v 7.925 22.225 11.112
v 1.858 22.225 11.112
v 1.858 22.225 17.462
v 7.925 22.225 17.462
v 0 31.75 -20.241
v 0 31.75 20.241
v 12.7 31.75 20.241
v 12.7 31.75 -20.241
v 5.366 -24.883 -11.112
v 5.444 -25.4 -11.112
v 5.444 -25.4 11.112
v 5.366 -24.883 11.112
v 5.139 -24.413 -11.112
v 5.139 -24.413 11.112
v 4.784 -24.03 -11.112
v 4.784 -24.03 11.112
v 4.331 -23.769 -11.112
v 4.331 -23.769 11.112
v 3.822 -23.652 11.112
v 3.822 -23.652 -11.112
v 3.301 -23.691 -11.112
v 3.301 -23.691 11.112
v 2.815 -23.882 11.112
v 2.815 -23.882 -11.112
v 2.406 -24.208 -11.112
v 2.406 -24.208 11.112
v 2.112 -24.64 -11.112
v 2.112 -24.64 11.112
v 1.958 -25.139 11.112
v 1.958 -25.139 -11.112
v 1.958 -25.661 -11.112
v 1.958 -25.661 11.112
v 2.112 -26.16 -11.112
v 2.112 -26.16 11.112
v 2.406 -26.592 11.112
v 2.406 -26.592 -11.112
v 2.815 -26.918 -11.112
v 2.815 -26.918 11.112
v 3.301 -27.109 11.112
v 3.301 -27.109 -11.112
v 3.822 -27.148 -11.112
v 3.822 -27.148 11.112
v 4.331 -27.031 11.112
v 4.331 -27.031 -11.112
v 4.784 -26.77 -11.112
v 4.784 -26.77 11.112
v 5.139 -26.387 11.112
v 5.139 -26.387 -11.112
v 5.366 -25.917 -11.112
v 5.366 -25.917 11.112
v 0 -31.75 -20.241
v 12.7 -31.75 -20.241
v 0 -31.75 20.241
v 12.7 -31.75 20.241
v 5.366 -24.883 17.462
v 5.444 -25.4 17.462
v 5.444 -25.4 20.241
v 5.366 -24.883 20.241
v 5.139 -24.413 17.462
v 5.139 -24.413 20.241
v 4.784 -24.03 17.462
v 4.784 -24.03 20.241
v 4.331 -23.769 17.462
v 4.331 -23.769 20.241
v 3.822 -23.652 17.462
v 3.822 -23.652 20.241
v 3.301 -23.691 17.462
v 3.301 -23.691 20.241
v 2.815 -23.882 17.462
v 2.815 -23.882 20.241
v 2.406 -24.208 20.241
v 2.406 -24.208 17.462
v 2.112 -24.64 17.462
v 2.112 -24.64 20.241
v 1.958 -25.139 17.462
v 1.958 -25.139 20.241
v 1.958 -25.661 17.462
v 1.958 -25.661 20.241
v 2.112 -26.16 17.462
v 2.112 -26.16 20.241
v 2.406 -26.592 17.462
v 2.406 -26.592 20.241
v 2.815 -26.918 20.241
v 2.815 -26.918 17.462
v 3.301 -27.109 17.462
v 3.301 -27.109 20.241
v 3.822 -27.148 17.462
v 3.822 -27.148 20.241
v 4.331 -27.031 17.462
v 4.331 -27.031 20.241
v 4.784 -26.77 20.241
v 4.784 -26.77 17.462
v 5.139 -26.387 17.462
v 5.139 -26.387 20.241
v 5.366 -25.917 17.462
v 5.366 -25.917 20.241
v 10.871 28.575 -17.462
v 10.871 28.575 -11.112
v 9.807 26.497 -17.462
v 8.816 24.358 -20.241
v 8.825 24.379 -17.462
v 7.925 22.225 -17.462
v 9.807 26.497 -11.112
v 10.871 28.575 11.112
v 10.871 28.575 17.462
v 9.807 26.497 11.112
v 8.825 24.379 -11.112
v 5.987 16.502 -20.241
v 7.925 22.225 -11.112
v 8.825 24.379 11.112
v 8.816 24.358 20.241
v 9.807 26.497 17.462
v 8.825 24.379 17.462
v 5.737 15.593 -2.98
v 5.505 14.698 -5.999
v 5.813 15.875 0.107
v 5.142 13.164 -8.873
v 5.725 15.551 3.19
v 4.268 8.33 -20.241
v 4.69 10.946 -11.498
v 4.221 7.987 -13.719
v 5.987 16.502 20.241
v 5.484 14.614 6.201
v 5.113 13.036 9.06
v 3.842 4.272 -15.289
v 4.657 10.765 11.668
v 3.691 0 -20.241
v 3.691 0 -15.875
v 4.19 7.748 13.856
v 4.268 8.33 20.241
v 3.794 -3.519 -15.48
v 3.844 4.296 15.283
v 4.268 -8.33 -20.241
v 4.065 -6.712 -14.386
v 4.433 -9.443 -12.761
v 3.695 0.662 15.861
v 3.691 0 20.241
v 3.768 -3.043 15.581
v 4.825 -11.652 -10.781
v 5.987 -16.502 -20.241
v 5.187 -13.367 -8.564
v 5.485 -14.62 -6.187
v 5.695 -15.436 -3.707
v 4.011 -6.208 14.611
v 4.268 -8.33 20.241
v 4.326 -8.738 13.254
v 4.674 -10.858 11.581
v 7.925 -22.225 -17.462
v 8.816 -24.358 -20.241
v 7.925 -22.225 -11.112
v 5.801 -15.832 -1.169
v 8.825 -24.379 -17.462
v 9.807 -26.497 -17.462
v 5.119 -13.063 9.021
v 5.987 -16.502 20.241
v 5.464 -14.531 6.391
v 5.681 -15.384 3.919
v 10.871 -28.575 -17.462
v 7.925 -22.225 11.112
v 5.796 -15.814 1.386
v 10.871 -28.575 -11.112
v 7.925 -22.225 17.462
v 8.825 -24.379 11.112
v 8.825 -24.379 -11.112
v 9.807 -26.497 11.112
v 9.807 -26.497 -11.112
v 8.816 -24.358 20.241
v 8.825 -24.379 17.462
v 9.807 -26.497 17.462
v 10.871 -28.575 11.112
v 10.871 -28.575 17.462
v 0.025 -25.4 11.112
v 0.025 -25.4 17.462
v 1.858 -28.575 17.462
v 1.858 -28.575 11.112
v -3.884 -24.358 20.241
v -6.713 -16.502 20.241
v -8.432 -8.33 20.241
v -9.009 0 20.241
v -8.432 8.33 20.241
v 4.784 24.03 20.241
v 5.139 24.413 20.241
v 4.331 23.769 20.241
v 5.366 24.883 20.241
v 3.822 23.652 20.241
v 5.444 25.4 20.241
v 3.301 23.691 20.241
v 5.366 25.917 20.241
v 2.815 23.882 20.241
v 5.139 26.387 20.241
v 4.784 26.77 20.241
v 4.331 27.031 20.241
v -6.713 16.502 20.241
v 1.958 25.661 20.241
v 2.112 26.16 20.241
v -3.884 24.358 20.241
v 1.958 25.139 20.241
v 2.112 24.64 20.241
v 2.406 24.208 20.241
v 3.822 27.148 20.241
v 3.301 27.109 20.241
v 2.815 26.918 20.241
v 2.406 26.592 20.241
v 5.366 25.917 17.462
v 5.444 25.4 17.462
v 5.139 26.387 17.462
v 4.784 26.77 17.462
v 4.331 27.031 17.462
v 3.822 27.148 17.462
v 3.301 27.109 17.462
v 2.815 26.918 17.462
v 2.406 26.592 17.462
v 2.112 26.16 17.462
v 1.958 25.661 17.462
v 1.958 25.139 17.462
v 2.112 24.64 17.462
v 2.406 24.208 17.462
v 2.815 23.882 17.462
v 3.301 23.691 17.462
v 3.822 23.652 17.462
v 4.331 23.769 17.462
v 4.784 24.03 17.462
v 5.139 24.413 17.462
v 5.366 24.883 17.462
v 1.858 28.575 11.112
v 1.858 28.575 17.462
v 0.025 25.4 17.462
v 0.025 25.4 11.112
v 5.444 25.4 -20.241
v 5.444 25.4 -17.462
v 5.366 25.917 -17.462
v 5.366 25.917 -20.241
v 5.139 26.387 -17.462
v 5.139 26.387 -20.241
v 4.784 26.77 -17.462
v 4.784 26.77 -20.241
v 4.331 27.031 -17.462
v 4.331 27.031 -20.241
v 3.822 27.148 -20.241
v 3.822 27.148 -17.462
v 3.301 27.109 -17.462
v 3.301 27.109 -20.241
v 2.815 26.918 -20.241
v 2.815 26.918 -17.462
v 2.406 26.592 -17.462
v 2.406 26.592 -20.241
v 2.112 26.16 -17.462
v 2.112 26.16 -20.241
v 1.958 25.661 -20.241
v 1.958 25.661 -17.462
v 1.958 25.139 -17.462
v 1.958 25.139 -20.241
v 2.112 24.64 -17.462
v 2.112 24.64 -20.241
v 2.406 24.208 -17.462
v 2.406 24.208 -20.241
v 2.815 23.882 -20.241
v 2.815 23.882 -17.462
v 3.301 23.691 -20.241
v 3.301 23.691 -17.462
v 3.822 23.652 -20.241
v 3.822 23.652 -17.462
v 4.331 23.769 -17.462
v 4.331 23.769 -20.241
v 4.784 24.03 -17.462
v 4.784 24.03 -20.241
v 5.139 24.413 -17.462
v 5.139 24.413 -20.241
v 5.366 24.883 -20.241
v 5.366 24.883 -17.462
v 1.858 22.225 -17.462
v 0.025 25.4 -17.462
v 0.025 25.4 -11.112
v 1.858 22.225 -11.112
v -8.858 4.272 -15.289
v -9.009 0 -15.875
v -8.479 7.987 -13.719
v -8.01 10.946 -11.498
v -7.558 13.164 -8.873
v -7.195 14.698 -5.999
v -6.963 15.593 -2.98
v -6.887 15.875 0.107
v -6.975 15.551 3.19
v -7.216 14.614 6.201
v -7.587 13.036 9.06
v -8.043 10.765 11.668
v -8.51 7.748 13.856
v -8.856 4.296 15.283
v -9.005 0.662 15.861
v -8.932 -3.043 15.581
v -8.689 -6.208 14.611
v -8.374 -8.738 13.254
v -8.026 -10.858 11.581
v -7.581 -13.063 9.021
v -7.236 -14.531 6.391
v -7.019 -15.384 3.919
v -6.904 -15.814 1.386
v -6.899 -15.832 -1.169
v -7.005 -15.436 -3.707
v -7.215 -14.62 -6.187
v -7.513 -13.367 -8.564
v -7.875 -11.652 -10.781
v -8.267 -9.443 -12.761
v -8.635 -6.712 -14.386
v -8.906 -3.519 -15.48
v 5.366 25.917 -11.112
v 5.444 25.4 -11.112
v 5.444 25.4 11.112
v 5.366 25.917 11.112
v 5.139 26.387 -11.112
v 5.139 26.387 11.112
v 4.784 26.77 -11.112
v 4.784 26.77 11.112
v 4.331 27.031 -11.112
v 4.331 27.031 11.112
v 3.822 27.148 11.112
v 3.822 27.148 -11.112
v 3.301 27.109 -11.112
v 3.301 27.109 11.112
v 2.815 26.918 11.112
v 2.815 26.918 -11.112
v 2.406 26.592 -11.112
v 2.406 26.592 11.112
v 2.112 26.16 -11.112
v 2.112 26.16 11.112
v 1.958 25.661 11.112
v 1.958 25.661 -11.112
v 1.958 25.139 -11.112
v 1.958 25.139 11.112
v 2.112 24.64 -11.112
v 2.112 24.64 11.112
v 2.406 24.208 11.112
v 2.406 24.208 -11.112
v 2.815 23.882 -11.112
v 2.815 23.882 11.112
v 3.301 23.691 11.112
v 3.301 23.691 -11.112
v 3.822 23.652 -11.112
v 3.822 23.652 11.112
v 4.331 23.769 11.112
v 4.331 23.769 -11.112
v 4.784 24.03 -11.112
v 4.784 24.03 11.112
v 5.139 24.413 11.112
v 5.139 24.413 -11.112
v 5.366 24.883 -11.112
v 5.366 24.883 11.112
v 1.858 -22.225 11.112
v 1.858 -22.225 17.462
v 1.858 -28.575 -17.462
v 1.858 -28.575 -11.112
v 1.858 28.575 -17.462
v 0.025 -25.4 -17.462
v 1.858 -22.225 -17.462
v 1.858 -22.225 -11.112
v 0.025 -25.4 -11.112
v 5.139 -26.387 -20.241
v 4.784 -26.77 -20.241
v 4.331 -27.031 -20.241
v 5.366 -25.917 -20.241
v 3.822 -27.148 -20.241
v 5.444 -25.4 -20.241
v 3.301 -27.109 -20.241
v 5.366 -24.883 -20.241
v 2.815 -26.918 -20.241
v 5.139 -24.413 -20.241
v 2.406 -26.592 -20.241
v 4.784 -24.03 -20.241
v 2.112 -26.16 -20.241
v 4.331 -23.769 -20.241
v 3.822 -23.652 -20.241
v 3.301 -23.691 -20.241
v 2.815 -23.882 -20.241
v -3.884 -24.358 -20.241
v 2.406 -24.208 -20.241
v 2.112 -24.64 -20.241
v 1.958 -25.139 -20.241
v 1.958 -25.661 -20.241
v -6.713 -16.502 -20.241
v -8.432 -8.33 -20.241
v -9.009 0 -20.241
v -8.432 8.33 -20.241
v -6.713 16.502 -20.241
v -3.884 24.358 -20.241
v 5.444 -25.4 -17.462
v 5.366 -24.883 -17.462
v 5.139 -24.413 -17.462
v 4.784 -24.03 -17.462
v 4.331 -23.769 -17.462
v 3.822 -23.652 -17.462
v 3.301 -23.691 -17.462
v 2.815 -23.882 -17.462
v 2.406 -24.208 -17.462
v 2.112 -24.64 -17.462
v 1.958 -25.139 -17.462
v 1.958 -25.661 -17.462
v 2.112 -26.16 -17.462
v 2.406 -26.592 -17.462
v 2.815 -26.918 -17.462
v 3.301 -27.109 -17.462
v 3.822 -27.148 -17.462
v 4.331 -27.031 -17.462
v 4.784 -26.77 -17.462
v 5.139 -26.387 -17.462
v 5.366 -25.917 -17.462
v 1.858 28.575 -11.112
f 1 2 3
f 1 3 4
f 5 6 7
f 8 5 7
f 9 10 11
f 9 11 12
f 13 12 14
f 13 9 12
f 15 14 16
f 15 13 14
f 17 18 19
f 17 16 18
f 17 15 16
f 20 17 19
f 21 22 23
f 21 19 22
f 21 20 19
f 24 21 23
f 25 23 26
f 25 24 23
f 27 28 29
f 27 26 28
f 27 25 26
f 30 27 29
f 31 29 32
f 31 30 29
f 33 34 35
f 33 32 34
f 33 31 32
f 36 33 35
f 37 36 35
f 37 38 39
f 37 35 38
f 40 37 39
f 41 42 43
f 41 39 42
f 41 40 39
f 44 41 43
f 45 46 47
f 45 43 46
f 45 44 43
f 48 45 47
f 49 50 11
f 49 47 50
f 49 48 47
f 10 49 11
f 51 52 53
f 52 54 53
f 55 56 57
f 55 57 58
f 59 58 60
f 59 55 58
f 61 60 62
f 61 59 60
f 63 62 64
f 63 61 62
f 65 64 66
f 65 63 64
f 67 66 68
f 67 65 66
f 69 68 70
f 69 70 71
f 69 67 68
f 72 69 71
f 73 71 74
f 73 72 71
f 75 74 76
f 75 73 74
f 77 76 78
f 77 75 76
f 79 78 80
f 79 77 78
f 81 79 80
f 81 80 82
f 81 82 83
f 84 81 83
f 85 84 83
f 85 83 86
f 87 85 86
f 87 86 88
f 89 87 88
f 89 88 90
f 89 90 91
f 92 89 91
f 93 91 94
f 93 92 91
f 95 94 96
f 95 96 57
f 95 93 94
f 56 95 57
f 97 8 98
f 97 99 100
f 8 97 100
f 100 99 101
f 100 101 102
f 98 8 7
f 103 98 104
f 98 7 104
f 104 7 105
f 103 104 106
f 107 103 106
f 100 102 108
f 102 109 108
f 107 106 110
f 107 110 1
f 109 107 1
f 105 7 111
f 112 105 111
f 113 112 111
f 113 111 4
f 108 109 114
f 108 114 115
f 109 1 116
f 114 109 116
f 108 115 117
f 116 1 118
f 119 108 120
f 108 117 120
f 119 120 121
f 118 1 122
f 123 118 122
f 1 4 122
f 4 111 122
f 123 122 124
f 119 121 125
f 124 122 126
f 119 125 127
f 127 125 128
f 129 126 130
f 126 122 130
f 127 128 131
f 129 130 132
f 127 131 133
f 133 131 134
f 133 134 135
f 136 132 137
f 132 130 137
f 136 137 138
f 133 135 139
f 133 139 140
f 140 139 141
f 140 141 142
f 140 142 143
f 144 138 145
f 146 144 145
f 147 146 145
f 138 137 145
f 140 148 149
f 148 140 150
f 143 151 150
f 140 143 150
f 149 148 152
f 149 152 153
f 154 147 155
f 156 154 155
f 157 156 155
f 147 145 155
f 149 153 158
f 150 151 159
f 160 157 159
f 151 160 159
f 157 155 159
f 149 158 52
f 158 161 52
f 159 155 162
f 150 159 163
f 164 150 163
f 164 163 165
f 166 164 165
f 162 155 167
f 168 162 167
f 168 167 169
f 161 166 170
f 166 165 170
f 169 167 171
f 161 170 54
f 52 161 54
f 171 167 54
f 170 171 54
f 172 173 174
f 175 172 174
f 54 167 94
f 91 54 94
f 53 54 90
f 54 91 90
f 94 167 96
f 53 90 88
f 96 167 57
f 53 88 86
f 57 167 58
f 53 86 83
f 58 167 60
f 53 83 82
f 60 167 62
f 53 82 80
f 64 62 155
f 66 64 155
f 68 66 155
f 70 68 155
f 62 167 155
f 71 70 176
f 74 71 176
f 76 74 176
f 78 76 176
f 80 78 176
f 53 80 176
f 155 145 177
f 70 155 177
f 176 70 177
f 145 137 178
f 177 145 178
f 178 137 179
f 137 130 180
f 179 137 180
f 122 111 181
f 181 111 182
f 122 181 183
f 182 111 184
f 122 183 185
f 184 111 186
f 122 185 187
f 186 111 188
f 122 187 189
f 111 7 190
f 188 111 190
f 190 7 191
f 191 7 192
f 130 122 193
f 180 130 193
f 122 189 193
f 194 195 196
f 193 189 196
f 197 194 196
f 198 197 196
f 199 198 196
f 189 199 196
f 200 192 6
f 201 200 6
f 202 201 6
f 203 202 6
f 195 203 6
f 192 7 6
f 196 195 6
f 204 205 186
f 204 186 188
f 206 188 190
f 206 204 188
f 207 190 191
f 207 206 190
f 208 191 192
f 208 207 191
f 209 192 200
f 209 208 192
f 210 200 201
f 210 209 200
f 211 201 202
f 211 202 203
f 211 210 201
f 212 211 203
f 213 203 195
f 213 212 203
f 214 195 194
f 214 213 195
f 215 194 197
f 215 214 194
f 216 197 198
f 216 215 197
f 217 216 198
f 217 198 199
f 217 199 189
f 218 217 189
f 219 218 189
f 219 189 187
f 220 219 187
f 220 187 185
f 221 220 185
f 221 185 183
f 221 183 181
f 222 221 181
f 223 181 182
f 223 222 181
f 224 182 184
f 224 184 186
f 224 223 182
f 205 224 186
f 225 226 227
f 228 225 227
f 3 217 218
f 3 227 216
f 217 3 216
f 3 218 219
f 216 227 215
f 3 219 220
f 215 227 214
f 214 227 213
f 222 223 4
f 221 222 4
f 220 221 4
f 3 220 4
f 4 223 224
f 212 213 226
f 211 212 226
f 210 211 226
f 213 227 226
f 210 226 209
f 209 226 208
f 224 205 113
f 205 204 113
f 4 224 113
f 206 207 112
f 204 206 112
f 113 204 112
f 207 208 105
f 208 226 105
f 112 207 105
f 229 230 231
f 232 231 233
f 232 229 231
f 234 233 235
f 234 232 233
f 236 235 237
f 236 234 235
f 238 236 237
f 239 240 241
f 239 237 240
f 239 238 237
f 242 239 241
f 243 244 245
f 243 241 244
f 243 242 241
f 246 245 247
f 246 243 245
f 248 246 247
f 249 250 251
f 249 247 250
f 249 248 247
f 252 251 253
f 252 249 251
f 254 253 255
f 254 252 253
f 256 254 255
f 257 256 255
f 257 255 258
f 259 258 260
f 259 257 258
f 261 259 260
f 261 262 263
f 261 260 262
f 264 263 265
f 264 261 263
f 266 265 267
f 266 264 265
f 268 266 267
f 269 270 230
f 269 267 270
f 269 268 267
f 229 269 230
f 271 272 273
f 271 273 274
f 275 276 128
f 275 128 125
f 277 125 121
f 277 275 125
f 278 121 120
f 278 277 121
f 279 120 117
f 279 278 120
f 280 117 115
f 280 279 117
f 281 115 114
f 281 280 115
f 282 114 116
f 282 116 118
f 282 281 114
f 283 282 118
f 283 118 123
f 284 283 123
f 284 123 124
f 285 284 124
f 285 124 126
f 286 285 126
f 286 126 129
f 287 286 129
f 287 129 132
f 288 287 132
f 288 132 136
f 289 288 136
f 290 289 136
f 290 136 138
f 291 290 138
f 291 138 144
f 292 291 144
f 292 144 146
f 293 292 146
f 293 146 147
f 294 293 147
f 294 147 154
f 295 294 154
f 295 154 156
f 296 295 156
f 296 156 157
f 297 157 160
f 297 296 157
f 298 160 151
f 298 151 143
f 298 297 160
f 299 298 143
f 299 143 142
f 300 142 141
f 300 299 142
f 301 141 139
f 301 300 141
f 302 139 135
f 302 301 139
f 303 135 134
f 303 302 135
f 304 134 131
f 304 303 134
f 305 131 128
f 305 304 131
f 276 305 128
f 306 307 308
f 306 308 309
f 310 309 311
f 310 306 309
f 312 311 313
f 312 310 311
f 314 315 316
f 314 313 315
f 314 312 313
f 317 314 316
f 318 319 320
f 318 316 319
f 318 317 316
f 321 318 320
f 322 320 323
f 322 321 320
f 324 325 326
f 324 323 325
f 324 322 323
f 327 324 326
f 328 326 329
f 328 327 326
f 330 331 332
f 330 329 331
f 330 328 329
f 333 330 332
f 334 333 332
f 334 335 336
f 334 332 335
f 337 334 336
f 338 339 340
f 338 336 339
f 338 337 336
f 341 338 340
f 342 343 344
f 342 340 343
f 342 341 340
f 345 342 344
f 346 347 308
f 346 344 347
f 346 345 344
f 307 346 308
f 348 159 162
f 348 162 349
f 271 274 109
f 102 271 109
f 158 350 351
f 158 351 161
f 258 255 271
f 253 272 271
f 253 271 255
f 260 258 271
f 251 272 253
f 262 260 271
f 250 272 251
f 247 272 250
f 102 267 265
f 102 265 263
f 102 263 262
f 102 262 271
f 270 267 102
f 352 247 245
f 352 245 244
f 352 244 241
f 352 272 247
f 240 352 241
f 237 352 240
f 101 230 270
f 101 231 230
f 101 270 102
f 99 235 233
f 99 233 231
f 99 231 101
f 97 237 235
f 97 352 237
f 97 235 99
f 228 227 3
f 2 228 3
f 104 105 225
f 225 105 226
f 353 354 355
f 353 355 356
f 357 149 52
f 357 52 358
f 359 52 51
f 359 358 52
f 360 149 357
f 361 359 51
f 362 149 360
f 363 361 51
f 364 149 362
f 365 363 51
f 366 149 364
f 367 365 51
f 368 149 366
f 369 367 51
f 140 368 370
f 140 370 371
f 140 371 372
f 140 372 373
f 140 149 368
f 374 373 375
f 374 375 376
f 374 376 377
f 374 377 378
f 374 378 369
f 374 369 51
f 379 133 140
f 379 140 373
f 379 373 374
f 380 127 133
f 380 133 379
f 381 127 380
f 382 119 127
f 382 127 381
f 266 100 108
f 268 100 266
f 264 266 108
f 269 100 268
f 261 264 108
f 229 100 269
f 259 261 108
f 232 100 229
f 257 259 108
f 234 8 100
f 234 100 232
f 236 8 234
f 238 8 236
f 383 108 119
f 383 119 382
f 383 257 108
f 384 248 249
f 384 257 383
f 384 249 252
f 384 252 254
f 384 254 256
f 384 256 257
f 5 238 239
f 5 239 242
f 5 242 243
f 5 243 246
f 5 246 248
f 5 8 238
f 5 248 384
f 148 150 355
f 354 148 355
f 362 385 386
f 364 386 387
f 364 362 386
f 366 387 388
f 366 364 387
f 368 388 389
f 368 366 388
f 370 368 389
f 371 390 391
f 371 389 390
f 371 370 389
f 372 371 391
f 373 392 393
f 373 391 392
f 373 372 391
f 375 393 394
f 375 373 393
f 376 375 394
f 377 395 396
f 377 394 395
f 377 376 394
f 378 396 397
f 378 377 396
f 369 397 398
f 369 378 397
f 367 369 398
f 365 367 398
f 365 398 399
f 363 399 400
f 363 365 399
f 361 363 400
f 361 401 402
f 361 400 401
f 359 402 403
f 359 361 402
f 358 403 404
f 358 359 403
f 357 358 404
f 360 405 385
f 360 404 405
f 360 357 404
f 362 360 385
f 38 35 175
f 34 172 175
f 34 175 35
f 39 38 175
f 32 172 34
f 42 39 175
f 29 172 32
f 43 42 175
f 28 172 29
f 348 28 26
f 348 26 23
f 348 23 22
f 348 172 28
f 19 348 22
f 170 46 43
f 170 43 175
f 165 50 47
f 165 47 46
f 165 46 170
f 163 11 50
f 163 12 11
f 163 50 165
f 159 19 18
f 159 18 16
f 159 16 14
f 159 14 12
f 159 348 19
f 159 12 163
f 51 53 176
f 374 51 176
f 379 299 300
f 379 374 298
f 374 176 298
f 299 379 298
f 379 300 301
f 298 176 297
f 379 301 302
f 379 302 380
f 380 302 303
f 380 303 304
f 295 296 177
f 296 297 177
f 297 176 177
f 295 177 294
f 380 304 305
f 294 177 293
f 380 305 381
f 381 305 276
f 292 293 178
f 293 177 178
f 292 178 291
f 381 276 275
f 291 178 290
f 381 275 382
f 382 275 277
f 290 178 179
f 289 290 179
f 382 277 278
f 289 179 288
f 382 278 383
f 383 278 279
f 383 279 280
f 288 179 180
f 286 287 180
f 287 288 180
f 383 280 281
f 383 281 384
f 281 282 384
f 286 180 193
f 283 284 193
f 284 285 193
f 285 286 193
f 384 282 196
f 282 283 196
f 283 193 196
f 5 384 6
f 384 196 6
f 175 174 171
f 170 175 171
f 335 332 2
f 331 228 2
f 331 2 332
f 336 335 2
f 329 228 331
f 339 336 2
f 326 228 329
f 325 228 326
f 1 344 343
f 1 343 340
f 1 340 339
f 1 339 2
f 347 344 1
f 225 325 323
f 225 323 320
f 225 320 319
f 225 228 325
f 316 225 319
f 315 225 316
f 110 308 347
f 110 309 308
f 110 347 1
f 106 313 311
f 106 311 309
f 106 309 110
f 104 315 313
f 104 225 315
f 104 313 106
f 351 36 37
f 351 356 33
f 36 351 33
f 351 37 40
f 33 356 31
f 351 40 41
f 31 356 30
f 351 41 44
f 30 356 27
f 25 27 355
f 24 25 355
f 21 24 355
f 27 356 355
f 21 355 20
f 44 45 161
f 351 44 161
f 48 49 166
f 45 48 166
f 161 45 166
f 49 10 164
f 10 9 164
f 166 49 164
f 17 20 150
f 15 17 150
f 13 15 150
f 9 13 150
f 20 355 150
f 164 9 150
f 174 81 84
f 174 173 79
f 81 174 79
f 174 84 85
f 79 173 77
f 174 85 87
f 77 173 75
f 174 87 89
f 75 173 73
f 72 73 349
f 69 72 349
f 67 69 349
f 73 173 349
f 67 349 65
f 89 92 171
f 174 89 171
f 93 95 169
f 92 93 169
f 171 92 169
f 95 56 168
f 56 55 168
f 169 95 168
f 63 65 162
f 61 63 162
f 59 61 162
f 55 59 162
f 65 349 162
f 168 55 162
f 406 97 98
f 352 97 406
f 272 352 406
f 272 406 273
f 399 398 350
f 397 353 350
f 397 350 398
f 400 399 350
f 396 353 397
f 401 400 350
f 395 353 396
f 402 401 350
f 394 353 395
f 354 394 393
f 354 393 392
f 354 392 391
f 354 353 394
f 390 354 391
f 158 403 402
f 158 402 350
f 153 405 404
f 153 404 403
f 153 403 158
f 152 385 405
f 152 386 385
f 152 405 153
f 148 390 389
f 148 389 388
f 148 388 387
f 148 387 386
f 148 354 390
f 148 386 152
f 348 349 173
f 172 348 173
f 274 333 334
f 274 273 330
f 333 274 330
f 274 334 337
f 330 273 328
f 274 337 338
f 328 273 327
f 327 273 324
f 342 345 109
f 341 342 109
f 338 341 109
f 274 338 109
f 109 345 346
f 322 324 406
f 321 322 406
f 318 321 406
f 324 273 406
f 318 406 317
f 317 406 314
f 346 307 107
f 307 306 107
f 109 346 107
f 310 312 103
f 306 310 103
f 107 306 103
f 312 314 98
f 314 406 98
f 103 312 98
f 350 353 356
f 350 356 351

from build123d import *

# Parameters (mm, degrees)
SKETCH1_R               = 1.7526
BOSS_EXTRUDE1_DEPTH     = 20.240625
CUT_EXTRUDE1_START      = 17.4625
CUT_EXTRUDE1_DEPTH      = 6.35
CUT_EXTRUDE2_START      = -17.4625
CUT_EXTRUDE2_DEPTH      = 6.35
CUT_EXTRUDE3_DEPTH      = 40.737078408
CUT_EXTRUDE3_DEPTH_BACK = 40.737078408
SKETCH4_R               = 15.875


with BuildPart() as part:
    # Sketch1 → Boss-Extrude1 (new, symmetric)
    with BuildSketch(Plane.XY):
        with BuildLine():
            Line((0, 31.75), (12.7, 31.75))
            ThreePointArc((12.7, 31.75), (3.690995675, 0), (12.7, -31.75))
            Line((12.7, -31.75), (0, -31.75))
            ThreePointArc((0, -31.75), (-9.009004325, 0), (0, 31.75))
        make_face()
        with Locations((3.690995675, 25.4)):
            Circle(SKETCH1_R, mode=Mode.SUBTRACT)
        with Locations((3.690995675, -25.4)):
            Circle(SKETCH1_R, mode=Mode.SUBTRACT)
    extrude(amount=BOSS_EXTRUDE1_DEPTH, both=True)

    # Sketch2 → Cut-Extrude1 (cut)
    with BuildSketch(Plane.XY.offset(CUT_EXTRUDE1_START)):
        Polygon((21.851555668, 28.575), (1.85790857, 28.575), (0.024821465, 25.4), (1.85790857, 22.225), (21.851555668, 22.225), align=None)
        Polygon((21.851555668, -28.575), (21.851555668, -22.225), (1.85790857, -22.225), (0.024821465, -25.4), (1.85790857, -28.575), align=None)
    extrude(amount=-CUT_EXTRUDE1_DEPTH, mode=Mode.SUBTRACT)

    # Sketch2<2> → Cut-Extrude2 (cut)
    with BuildSketch(Plane.XY.offset(CUT_EXTRUDE2_START)):
        Polygon((21.851555668, 28.575), (1.85790857, 28.575), (0.024821465, 25.4), (1.85790857, 22.225), (21.851555668, 22.225), align=None)
        Polygon((21.851555668, -28.575), (21.851555668, -22.225), (1.85790857, -22.225), (0.024821465, -25.4), (1.85790857, -28.575), align=None)
    extrude(amount=CUT_EXTRUDE2_DEPTH, mode=Mode.SUBTRACT)

    # Sketch4 → Cut-Extrude3 (cut, two sides: drawn at the far end of the back side and taken through both)
    with BuildSketch(Plane(origin=(0, 0, 0), x_dir=(0, 0, -1), z_dir=(1, 0, 0)).offset(-CUT_EXTRUDE3_DEPTH_BACK)):
        Circle(SKETCH4_R)
    extrude(amount=CUT_EXTRUDE3_DEPTH + CUT_EXTRUDE3_DEPTH_BACK, mode=Mode.SUBTRACT)


solid = part.part
